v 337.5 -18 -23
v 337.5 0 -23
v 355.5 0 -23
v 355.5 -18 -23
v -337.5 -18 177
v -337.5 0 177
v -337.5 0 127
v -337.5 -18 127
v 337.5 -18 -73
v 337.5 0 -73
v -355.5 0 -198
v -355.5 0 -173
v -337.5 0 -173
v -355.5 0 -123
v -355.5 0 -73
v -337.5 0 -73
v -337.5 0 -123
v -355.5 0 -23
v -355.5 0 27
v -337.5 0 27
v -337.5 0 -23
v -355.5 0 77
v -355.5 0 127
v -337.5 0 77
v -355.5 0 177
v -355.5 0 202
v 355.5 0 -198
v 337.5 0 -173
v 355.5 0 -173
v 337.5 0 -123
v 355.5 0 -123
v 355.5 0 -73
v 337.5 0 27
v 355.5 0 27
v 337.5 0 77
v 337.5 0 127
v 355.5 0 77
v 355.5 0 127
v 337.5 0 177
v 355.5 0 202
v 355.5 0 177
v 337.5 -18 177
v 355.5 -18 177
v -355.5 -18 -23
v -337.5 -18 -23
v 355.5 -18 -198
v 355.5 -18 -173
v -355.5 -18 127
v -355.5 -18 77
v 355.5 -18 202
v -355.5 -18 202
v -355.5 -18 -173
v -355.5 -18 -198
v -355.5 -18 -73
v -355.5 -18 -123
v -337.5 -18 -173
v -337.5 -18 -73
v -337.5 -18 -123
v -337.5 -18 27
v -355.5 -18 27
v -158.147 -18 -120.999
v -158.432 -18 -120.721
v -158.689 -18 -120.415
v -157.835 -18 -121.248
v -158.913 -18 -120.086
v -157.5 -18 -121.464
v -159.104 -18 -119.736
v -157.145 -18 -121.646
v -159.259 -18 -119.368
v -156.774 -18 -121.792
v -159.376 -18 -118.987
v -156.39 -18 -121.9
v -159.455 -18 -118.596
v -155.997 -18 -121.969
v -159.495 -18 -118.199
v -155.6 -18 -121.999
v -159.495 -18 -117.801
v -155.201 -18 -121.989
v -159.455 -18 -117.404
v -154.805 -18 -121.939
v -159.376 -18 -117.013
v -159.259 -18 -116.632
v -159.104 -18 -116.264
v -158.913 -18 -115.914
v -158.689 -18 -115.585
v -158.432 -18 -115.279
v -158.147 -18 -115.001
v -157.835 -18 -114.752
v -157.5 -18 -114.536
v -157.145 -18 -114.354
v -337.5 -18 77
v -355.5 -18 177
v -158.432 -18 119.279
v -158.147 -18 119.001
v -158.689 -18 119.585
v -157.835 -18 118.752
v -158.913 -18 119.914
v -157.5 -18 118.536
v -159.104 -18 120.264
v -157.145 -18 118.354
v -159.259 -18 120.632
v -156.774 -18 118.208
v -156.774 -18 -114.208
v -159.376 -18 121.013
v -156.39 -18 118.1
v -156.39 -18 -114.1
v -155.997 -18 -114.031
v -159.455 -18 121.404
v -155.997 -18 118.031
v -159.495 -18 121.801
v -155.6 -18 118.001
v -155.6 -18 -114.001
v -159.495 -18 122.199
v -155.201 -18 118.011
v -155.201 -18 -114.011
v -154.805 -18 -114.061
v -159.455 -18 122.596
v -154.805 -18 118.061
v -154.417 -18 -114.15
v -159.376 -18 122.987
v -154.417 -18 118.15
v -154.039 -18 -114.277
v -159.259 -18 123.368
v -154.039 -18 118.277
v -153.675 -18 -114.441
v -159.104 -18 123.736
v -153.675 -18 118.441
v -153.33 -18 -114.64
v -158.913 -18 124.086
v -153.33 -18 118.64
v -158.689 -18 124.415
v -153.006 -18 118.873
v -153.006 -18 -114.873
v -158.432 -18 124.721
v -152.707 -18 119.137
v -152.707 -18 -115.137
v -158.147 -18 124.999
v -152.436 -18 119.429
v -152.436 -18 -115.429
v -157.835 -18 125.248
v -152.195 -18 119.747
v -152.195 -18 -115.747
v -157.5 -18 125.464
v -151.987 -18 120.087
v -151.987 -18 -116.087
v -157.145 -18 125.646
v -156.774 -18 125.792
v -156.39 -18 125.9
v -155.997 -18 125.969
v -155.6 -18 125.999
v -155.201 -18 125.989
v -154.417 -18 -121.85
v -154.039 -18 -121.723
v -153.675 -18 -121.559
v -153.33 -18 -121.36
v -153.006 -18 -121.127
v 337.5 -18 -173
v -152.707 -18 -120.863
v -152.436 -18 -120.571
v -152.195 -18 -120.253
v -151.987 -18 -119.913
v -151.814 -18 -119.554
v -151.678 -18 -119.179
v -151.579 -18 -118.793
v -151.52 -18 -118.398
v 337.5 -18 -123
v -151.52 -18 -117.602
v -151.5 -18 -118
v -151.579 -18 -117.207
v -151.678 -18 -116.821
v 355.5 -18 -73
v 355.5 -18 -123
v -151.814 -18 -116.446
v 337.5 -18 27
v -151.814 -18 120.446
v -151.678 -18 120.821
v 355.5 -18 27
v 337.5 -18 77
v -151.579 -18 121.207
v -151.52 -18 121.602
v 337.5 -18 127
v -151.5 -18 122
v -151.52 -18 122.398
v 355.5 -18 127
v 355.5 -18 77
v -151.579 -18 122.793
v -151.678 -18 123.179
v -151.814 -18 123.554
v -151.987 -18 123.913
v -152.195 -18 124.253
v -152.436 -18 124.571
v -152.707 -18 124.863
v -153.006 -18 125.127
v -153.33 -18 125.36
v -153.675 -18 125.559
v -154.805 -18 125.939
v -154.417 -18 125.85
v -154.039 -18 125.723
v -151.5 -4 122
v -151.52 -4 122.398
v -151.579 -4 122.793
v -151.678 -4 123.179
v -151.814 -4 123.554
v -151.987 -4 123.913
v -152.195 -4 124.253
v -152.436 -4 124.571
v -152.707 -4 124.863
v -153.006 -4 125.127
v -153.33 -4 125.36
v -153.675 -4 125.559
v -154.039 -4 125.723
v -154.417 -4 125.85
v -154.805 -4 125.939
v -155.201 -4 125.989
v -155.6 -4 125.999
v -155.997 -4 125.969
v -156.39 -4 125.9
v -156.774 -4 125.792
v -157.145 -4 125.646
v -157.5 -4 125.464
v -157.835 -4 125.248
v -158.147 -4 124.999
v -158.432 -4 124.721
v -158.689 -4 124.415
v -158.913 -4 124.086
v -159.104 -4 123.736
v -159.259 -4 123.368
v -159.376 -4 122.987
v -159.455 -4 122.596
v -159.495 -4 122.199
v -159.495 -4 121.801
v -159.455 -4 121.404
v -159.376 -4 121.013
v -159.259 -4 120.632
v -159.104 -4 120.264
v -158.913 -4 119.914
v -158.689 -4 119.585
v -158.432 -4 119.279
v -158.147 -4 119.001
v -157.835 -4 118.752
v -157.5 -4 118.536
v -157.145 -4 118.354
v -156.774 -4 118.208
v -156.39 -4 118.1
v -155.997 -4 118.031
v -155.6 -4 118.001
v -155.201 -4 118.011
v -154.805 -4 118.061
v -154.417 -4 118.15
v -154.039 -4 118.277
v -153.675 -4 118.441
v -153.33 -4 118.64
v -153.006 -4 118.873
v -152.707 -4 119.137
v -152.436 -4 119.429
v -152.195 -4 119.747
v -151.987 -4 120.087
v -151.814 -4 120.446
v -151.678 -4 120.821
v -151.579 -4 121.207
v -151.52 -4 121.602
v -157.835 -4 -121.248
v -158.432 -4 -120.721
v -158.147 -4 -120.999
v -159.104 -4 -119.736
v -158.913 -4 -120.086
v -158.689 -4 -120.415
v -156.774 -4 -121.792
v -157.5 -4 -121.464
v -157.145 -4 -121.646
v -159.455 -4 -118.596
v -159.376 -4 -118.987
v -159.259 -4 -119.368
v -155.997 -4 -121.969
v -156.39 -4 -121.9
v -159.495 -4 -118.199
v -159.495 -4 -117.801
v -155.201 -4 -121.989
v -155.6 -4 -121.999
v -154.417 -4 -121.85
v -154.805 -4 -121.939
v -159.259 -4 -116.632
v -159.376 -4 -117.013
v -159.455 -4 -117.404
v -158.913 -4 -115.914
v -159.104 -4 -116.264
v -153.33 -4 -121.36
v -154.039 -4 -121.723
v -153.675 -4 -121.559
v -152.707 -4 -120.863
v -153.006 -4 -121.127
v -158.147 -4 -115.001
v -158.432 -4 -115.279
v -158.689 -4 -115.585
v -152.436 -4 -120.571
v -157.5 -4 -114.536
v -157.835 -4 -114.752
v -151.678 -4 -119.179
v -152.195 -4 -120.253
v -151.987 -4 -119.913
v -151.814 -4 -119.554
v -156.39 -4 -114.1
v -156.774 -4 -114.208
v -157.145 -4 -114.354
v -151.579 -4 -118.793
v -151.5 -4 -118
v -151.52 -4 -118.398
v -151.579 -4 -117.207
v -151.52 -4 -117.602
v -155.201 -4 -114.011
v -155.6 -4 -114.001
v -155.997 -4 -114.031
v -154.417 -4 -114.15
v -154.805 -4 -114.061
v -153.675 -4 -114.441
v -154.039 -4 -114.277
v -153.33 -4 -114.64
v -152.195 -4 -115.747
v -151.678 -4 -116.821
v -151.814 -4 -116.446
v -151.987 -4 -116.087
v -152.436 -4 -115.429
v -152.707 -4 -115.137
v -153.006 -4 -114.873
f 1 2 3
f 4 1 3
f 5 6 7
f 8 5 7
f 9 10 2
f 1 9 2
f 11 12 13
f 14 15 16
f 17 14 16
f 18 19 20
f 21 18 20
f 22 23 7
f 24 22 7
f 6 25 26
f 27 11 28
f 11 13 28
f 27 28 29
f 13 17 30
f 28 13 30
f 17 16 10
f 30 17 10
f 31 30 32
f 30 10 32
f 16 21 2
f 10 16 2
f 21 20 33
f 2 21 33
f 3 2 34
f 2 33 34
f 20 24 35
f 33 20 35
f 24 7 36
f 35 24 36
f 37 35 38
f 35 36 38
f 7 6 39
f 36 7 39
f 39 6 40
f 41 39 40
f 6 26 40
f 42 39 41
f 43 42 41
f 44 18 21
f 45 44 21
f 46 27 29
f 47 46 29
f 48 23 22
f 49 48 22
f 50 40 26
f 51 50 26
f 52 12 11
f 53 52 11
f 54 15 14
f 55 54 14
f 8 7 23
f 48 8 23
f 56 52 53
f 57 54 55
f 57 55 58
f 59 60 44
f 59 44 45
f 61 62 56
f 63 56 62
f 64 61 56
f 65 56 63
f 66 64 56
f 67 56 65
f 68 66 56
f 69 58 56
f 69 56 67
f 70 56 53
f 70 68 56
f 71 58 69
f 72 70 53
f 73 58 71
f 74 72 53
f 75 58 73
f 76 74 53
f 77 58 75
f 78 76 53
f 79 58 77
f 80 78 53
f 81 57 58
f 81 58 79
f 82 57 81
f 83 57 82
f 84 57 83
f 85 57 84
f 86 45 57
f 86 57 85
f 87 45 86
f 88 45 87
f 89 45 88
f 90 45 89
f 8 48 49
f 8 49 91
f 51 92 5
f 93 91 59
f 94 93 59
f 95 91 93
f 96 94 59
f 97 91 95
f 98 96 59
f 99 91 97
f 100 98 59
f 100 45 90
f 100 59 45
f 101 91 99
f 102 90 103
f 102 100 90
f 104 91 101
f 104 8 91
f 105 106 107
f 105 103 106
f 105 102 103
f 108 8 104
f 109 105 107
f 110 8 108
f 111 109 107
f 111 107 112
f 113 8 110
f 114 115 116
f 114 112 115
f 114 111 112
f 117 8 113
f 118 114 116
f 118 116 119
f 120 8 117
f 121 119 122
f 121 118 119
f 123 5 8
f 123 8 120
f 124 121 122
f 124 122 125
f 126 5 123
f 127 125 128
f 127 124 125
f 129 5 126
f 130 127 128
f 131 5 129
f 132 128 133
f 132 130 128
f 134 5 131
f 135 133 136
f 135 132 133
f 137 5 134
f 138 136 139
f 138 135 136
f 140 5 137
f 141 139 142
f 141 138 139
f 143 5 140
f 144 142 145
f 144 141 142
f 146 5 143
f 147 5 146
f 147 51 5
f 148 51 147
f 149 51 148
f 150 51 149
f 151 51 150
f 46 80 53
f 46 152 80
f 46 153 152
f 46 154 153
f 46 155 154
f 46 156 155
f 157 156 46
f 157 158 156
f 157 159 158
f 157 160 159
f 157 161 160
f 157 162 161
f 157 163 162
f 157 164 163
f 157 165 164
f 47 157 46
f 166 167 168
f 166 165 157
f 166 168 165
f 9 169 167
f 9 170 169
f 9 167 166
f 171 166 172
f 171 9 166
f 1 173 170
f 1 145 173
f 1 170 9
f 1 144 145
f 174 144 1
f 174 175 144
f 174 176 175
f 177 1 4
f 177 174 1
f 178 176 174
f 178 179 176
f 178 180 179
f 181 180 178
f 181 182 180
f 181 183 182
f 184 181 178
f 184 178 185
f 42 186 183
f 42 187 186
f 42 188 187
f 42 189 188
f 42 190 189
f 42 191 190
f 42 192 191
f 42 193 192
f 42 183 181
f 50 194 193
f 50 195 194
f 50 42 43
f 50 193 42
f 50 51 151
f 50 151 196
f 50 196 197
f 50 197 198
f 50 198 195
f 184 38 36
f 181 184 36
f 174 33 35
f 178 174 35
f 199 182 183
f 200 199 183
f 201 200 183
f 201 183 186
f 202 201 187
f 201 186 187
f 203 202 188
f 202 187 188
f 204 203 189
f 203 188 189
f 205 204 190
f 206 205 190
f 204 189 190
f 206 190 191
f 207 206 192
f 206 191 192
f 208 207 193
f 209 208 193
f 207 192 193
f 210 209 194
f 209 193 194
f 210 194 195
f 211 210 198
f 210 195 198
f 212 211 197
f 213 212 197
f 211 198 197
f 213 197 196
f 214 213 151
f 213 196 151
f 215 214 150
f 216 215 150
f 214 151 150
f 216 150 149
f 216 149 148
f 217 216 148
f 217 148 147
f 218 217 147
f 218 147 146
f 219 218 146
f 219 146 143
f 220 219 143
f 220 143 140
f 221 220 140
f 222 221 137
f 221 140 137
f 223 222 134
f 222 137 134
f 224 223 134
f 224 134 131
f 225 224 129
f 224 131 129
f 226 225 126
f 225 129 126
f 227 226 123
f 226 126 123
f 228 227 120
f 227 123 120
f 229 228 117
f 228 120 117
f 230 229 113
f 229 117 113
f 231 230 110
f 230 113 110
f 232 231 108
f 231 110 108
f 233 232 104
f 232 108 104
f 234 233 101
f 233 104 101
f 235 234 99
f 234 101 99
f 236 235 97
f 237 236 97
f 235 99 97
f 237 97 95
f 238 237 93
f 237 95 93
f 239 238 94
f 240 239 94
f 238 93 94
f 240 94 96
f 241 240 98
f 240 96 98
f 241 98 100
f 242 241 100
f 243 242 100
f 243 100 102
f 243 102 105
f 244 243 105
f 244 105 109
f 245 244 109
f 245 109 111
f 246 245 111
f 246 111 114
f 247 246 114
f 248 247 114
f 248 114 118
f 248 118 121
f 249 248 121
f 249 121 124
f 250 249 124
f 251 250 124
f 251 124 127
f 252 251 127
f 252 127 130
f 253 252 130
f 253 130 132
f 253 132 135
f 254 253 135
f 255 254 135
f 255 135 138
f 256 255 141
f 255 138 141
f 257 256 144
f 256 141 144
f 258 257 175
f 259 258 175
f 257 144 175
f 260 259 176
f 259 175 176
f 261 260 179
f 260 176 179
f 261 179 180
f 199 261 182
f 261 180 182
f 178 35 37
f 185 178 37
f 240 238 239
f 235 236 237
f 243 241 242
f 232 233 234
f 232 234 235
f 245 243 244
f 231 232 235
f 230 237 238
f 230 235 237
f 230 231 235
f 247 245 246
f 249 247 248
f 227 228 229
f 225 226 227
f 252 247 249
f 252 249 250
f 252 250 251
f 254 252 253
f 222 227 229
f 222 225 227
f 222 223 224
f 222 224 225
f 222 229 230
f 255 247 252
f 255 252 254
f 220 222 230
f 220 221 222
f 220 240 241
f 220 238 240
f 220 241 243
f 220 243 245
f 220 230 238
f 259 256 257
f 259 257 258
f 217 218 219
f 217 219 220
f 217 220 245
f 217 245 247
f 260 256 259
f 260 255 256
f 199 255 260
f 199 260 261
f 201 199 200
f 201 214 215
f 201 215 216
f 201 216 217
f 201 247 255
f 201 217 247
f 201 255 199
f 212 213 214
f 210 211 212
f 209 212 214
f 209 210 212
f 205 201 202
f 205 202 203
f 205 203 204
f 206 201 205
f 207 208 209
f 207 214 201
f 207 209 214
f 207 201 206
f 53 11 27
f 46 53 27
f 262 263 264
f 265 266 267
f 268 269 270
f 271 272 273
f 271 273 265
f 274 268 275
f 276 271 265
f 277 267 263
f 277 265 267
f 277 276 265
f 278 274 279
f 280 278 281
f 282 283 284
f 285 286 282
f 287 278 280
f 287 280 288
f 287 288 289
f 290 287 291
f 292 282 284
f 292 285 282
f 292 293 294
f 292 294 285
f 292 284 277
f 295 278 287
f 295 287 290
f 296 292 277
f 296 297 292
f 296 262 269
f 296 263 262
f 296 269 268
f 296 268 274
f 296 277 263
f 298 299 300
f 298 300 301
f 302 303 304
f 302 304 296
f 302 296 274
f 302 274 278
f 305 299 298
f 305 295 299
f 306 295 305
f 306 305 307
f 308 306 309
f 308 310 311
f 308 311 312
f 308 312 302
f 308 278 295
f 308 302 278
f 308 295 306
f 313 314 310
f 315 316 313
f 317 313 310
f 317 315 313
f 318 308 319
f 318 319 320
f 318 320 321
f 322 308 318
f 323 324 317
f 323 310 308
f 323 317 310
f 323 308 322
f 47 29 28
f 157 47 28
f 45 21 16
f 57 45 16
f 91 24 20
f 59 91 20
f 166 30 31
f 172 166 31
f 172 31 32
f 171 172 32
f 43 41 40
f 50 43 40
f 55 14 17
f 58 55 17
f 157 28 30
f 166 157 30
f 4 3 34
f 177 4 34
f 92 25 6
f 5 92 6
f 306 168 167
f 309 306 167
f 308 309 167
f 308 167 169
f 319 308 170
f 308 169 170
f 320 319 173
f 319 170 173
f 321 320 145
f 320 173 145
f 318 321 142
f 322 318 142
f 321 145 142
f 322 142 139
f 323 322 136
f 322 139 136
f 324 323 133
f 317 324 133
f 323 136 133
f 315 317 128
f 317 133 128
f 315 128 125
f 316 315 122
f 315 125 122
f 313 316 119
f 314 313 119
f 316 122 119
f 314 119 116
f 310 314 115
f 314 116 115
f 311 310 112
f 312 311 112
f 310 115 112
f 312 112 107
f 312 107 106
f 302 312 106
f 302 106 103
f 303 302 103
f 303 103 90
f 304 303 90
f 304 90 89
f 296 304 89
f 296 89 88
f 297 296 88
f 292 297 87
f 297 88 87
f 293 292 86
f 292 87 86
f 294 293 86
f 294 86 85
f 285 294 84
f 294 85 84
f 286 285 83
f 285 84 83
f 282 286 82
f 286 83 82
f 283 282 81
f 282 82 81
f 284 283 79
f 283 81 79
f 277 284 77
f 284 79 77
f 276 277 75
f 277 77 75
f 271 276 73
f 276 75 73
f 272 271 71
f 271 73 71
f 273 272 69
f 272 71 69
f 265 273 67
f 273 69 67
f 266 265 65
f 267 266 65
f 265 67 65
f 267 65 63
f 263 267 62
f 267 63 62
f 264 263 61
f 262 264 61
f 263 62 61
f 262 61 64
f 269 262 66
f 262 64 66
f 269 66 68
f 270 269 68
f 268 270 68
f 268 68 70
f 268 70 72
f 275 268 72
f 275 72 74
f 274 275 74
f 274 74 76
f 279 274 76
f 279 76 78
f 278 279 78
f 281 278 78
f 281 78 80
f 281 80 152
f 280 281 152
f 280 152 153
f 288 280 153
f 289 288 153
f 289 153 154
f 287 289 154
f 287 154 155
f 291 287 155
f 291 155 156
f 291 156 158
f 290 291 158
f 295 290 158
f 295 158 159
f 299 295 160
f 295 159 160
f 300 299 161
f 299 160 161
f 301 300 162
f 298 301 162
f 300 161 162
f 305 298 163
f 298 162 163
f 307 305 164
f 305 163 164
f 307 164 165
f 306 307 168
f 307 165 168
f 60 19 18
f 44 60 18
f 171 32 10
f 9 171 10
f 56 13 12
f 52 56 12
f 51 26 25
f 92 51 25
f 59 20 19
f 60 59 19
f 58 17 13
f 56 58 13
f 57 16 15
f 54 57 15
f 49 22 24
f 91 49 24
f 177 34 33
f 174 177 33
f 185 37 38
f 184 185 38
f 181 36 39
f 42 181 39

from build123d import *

# Parameters (mm, degrees)
F1_DEPTH = 18
F2_R     = 4
F3_DEPTH = 14


with BuildPart() as f1:
    # F0 (on Front) → F1 (new body)
    with BuildSketch(Plane.XZ):
        Polygon((355.5, 202), (-355.5, 202), (-355.5, 177), (-337.5, 177), (-337.5, 127), (-355.5, 127), (-355.5, 77), (-337.5, 77), (-337.5, 27), (-355.5, 27), (-355.5, -23), (-337.5, -23), (-337.5, -73), (-355.5, -73), (-355.5, -123), (-337.5, -123), (-337.5, -173), (-355.5, -173), (-355.5, -198), (355.5, -198), (355.5, -173), (337.5, -173), (337.5, -123), (355.5, -123), (355.5, -73), (337.5, -73), (337.5, -23), (355.5, -23), (355.5, 27), (337.5, 27), (337.5, 77), (355.5, 77), (355.5, 127), (337.5, 127), (337.5, 177), (355.5, 177), align=None)
    extrude(amount=F1_DEPTH)

    # F2 (on face) → F3 (cut)
    with BuildSketch(Plane.XZ.offset(18)):
        with Locations((-155.5, -118)):
            Circle(F2_R)
        with Locations((-155.5, 122)):
            Circle(F2_R)
    extrude(amount=-F3_DEPTH, mode=Mode.SUBTRACT)


solid = f1.part
